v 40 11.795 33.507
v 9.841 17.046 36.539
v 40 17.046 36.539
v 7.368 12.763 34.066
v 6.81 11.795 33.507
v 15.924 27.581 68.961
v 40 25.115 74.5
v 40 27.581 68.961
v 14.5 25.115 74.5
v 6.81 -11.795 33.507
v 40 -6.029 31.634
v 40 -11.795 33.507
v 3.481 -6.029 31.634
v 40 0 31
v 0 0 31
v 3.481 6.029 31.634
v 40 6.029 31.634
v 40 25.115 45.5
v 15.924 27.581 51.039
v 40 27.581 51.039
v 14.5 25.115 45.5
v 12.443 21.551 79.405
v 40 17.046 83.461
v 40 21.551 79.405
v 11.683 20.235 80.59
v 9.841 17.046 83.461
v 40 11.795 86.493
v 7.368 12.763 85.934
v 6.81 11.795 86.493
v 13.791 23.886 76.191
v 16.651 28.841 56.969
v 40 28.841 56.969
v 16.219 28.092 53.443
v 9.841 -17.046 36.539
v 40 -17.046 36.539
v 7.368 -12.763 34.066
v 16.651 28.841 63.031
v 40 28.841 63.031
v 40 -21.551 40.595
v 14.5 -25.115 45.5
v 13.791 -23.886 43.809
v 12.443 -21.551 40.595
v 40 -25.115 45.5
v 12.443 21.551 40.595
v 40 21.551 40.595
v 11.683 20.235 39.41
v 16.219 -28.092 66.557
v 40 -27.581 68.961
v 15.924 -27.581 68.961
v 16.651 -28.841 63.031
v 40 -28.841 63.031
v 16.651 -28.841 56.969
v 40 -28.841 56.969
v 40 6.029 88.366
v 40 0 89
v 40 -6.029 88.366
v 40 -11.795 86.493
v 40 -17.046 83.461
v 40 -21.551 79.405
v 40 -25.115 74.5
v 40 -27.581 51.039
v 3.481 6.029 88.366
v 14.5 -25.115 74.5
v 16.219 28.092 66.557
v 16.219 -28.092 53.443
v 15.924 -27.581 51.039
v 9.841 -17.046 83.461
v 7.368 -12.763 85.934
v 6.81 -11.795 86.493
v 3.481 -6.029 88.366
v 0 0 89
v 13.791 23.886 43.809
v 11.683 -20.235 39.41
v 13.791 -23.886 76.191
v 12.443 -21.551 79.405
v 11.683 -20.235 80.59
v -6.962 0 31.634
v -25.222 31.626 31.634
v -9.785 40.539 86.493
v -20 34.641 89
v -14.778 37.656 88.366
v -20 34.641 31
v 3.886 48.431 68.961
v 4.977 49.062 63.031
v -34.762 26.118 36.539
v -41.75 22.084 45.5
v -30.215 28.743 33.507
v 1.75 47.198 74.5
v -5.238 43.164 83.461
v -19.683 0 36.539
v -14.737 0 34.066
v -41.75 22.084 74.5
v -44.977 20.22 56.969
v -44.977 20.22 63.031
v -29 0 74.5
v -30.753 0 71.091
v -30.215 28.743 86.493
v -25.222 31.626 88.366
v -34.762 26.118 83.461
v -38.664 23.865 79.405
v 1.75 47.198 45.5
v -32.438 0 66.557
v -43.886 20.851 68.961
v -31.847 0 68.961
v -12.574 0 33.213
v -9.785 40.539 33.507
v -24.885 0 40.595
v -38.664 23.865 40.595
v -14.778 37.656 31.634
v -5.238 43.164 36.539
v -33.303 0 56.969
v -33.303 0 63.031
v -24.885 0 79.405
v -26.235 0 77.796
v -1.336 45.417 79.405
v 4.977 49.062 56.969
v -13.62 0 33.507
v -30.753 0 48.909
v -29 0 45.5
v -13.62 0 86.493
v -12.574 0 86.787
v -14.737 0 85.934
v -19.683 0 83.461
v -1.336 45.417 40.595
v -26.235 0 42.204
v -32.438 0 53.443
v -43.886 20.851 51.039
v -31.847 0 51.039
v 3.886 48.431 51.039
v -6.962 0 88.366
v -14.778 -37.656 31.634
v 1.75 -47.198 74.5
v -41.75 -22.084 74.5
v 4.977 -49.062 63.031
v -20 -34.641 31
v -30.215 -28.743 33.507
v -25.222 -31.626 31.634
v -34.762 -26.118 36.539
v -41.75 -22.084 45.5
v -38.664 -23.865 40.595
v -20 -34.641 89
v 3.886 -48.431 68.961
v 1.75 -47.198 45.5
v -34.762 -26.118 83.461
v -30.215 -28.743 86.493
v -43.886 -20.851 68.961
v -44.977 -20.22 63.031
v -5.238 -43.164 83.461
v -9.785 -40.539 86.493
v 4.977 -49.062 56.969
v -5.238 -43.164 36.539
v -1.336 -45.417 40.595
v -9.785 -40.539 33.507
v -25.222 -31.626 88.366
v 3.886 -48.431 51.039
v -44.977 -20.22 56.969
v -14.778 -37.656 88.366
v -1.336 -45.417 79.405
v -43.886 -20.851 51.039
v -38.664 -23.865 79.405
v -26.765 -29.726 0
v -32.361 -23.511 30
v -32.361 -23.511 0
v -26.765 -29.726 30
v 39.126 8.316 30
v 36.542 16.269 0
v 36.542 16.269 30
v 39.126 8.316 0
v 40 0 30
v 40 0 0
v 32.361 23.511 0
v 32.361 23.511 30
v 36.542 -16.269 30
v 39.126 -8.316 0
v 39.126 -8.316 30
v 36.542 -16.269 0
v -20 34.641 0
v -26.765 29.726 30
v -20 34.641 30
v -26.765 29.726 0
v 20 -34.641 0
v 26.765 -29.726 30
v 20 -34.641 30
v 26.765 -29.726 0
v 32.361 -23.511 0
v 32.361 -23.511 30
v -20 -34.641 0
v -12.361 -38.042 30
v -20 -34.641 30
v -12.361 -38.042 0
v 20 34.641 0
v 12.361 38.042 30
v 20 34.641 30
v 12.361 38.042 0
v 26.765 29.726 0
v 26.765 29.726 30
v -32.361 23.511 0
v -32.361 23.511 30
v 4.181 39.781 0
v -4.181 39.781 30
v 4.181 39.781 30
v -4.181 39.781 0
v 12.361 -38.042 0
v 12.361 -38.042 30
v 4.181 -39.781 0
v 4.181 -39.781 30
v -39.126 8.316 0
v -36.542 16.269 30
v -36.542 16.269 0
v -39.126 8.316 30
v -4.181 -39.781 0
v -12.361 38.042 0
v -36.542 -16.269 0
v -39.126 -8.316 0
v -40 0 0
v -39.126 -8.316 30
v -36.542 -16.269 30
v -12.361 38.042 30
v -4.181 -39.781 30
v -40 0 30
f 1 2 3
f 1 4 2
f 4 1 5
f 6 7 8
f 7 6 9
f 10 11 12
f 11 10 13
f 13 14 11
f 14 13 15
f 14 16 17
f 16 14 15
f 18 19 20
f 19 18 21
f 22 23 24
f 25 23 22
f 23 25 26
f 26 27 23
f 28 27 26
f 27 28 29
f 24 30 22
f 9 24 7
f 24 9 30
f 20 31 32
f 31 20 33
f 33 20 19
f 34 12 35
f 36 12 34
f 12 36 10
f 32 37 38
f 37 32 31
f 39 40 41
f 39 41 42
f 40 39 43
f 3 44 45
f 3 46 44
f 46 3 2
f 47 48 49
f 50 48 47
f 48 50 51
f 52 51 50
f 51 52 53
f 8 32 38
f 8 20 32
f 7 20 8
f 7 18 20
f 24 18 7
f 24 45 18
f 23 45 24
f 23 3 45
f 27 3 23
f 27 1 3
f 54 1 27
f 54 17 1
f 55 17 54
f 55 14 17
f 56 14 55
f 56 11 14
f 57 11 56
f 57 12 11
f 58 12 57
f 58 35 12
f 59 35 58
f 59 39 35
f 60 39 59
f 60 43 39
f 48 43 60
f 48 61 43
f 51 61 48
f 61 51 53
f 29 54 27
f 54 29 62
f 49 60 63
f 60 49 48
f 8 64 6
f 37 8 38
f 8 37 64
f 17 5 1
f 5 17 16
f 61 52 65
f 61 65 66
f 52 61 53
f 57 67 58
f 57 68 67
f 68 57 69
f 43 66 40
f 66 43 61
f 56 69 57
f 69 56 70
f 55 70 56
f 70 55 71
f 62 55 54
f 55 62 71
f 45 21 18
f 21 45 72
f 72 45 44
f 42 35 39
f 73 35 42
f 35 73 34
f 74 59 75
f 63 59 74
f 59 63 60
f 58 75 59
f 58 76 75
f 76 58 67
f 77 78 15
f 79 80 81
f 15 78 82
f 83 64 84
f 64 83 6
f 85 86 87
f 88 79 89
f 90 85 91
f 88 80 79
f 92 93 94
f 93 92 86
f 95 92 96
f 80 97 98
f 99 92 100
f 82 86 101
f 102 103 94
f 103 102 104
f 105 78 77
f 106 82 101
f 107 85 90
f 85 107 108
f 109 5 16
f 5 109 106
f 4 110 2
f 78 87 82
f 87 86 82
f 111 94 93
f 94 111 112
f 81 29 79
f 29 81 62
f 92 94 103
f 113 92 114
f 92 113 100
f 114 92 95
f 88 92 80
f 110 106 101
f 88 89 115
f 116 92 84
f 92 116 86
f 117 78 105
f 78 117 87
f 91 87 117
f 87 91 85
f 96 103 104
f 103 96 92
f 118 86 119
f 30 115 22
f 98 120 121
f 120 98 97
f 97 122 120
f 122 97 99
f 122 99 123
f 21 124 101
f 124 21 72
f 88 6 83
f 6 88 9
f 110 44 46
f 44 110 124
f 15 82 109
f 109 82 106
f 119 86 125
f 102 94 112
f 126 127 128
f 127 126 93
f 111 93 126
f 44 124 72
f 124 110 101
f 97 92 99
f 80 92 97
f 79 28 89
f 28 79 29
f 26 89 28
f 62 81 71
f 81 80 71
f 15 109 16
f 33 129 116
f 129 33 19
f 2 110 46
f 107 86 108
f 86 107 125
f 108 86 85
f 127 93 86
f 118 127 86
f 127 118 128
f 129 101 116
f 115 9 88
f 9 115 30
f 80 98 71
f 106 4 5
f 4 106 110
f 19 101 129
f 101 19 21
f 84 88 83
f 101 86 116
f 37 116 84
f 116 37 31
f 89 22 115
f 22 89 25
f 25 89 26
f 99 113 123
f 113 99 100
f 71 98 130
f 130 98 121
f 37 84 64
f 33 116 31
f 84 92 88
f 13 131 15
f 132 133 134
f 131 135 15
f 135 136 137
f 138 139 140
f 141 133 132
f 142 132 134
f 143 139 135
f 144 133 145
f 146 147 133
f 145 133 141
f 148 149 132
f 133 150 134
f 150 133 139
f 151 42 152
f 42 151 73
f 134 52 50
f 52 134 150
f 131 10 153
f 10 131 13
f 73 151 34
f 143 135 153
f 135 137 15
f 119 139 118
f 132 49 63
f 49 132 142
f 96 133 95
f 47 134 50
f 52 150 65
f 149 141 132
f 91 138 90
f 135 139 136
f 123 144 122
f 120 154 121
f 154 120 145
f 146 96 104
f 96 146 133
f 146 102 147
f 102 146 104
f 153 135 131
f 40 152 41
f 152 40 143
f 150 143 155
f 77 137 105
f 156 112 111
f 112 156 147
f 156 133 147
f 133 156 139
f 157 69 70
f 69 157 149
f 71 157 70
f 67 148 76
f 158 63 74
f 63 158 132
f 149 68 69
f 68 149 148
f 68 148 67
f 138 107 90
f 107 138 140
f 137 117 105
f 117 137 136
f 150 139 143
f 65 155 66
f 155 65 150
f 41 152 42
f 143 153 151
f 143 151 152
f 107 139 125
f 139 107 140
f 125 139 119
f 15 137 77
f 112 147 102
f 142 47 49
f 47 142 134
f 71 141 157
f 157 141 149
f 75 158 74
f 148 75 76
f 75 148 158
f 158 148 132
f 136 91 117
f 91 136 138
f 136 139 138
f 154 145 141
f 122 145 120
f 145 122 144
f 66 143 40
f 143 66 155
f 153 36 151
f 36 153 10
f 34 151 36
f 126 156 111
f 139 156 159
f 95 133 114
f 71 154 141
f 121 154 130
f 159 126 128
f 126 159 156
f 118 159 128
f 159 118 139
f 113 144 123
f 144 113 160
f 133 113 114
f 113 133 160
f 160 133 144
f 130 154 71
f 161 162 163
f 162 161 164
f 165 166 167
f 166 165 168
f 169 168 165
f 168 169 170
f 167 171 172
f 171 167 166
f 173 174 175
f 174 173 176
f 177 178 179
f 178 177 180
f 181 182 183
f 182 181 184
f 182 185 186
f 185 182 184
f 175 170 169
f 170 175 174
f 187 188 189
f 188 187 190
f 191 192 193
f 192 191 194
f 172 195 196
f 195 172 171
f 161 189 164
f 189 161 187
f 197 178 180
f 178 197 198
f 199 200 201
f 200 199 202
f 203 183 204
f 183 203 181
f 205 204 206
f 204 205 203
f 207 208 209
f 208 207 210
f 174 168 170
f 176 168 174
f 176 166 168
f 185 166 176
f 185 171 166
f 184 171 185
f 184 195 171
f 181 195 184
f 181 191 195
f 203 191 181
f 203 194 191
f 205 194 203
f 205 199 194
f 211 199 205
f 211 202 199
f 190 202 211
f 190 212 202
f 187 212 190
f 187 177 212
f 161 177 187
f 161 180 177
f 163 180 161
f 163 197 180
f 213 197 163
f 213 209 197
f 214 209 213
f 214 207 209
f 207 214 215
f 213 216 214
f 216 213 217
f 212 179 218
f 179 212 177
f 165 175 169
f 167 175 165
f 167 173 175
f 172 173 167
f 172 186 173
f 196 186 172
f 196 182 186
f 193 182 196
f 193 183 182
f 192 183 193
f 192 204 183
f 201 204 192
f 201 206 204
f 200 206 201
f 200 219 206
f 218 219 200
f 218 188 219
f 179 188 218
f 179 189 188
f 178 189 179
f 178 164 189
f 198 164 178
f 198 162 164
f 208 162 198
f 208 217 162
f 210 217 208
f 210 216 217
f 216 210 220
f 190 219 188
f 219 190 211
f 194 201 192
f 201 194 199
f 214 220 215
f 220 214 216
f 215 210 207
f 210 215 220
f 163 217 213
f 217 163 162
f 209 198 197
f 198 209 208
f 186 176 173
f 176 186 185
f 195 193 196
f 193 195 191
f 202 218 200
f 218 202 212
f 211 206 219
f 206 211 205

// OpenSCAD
cylinder(r=80/2, h=30);
translate([0,0,60])
{
	rotate(90, [0,1,0]) cylinder(r=58/2, h=40);
	rotate(120, [0,0,1]) rotate(90, [0,1,0]) cylinder(r=58/2, h=40);
	rotate(240, [0,0,1]) rotate(90, [0,1,0]) cylinder(r=58/2, h=40);
}
